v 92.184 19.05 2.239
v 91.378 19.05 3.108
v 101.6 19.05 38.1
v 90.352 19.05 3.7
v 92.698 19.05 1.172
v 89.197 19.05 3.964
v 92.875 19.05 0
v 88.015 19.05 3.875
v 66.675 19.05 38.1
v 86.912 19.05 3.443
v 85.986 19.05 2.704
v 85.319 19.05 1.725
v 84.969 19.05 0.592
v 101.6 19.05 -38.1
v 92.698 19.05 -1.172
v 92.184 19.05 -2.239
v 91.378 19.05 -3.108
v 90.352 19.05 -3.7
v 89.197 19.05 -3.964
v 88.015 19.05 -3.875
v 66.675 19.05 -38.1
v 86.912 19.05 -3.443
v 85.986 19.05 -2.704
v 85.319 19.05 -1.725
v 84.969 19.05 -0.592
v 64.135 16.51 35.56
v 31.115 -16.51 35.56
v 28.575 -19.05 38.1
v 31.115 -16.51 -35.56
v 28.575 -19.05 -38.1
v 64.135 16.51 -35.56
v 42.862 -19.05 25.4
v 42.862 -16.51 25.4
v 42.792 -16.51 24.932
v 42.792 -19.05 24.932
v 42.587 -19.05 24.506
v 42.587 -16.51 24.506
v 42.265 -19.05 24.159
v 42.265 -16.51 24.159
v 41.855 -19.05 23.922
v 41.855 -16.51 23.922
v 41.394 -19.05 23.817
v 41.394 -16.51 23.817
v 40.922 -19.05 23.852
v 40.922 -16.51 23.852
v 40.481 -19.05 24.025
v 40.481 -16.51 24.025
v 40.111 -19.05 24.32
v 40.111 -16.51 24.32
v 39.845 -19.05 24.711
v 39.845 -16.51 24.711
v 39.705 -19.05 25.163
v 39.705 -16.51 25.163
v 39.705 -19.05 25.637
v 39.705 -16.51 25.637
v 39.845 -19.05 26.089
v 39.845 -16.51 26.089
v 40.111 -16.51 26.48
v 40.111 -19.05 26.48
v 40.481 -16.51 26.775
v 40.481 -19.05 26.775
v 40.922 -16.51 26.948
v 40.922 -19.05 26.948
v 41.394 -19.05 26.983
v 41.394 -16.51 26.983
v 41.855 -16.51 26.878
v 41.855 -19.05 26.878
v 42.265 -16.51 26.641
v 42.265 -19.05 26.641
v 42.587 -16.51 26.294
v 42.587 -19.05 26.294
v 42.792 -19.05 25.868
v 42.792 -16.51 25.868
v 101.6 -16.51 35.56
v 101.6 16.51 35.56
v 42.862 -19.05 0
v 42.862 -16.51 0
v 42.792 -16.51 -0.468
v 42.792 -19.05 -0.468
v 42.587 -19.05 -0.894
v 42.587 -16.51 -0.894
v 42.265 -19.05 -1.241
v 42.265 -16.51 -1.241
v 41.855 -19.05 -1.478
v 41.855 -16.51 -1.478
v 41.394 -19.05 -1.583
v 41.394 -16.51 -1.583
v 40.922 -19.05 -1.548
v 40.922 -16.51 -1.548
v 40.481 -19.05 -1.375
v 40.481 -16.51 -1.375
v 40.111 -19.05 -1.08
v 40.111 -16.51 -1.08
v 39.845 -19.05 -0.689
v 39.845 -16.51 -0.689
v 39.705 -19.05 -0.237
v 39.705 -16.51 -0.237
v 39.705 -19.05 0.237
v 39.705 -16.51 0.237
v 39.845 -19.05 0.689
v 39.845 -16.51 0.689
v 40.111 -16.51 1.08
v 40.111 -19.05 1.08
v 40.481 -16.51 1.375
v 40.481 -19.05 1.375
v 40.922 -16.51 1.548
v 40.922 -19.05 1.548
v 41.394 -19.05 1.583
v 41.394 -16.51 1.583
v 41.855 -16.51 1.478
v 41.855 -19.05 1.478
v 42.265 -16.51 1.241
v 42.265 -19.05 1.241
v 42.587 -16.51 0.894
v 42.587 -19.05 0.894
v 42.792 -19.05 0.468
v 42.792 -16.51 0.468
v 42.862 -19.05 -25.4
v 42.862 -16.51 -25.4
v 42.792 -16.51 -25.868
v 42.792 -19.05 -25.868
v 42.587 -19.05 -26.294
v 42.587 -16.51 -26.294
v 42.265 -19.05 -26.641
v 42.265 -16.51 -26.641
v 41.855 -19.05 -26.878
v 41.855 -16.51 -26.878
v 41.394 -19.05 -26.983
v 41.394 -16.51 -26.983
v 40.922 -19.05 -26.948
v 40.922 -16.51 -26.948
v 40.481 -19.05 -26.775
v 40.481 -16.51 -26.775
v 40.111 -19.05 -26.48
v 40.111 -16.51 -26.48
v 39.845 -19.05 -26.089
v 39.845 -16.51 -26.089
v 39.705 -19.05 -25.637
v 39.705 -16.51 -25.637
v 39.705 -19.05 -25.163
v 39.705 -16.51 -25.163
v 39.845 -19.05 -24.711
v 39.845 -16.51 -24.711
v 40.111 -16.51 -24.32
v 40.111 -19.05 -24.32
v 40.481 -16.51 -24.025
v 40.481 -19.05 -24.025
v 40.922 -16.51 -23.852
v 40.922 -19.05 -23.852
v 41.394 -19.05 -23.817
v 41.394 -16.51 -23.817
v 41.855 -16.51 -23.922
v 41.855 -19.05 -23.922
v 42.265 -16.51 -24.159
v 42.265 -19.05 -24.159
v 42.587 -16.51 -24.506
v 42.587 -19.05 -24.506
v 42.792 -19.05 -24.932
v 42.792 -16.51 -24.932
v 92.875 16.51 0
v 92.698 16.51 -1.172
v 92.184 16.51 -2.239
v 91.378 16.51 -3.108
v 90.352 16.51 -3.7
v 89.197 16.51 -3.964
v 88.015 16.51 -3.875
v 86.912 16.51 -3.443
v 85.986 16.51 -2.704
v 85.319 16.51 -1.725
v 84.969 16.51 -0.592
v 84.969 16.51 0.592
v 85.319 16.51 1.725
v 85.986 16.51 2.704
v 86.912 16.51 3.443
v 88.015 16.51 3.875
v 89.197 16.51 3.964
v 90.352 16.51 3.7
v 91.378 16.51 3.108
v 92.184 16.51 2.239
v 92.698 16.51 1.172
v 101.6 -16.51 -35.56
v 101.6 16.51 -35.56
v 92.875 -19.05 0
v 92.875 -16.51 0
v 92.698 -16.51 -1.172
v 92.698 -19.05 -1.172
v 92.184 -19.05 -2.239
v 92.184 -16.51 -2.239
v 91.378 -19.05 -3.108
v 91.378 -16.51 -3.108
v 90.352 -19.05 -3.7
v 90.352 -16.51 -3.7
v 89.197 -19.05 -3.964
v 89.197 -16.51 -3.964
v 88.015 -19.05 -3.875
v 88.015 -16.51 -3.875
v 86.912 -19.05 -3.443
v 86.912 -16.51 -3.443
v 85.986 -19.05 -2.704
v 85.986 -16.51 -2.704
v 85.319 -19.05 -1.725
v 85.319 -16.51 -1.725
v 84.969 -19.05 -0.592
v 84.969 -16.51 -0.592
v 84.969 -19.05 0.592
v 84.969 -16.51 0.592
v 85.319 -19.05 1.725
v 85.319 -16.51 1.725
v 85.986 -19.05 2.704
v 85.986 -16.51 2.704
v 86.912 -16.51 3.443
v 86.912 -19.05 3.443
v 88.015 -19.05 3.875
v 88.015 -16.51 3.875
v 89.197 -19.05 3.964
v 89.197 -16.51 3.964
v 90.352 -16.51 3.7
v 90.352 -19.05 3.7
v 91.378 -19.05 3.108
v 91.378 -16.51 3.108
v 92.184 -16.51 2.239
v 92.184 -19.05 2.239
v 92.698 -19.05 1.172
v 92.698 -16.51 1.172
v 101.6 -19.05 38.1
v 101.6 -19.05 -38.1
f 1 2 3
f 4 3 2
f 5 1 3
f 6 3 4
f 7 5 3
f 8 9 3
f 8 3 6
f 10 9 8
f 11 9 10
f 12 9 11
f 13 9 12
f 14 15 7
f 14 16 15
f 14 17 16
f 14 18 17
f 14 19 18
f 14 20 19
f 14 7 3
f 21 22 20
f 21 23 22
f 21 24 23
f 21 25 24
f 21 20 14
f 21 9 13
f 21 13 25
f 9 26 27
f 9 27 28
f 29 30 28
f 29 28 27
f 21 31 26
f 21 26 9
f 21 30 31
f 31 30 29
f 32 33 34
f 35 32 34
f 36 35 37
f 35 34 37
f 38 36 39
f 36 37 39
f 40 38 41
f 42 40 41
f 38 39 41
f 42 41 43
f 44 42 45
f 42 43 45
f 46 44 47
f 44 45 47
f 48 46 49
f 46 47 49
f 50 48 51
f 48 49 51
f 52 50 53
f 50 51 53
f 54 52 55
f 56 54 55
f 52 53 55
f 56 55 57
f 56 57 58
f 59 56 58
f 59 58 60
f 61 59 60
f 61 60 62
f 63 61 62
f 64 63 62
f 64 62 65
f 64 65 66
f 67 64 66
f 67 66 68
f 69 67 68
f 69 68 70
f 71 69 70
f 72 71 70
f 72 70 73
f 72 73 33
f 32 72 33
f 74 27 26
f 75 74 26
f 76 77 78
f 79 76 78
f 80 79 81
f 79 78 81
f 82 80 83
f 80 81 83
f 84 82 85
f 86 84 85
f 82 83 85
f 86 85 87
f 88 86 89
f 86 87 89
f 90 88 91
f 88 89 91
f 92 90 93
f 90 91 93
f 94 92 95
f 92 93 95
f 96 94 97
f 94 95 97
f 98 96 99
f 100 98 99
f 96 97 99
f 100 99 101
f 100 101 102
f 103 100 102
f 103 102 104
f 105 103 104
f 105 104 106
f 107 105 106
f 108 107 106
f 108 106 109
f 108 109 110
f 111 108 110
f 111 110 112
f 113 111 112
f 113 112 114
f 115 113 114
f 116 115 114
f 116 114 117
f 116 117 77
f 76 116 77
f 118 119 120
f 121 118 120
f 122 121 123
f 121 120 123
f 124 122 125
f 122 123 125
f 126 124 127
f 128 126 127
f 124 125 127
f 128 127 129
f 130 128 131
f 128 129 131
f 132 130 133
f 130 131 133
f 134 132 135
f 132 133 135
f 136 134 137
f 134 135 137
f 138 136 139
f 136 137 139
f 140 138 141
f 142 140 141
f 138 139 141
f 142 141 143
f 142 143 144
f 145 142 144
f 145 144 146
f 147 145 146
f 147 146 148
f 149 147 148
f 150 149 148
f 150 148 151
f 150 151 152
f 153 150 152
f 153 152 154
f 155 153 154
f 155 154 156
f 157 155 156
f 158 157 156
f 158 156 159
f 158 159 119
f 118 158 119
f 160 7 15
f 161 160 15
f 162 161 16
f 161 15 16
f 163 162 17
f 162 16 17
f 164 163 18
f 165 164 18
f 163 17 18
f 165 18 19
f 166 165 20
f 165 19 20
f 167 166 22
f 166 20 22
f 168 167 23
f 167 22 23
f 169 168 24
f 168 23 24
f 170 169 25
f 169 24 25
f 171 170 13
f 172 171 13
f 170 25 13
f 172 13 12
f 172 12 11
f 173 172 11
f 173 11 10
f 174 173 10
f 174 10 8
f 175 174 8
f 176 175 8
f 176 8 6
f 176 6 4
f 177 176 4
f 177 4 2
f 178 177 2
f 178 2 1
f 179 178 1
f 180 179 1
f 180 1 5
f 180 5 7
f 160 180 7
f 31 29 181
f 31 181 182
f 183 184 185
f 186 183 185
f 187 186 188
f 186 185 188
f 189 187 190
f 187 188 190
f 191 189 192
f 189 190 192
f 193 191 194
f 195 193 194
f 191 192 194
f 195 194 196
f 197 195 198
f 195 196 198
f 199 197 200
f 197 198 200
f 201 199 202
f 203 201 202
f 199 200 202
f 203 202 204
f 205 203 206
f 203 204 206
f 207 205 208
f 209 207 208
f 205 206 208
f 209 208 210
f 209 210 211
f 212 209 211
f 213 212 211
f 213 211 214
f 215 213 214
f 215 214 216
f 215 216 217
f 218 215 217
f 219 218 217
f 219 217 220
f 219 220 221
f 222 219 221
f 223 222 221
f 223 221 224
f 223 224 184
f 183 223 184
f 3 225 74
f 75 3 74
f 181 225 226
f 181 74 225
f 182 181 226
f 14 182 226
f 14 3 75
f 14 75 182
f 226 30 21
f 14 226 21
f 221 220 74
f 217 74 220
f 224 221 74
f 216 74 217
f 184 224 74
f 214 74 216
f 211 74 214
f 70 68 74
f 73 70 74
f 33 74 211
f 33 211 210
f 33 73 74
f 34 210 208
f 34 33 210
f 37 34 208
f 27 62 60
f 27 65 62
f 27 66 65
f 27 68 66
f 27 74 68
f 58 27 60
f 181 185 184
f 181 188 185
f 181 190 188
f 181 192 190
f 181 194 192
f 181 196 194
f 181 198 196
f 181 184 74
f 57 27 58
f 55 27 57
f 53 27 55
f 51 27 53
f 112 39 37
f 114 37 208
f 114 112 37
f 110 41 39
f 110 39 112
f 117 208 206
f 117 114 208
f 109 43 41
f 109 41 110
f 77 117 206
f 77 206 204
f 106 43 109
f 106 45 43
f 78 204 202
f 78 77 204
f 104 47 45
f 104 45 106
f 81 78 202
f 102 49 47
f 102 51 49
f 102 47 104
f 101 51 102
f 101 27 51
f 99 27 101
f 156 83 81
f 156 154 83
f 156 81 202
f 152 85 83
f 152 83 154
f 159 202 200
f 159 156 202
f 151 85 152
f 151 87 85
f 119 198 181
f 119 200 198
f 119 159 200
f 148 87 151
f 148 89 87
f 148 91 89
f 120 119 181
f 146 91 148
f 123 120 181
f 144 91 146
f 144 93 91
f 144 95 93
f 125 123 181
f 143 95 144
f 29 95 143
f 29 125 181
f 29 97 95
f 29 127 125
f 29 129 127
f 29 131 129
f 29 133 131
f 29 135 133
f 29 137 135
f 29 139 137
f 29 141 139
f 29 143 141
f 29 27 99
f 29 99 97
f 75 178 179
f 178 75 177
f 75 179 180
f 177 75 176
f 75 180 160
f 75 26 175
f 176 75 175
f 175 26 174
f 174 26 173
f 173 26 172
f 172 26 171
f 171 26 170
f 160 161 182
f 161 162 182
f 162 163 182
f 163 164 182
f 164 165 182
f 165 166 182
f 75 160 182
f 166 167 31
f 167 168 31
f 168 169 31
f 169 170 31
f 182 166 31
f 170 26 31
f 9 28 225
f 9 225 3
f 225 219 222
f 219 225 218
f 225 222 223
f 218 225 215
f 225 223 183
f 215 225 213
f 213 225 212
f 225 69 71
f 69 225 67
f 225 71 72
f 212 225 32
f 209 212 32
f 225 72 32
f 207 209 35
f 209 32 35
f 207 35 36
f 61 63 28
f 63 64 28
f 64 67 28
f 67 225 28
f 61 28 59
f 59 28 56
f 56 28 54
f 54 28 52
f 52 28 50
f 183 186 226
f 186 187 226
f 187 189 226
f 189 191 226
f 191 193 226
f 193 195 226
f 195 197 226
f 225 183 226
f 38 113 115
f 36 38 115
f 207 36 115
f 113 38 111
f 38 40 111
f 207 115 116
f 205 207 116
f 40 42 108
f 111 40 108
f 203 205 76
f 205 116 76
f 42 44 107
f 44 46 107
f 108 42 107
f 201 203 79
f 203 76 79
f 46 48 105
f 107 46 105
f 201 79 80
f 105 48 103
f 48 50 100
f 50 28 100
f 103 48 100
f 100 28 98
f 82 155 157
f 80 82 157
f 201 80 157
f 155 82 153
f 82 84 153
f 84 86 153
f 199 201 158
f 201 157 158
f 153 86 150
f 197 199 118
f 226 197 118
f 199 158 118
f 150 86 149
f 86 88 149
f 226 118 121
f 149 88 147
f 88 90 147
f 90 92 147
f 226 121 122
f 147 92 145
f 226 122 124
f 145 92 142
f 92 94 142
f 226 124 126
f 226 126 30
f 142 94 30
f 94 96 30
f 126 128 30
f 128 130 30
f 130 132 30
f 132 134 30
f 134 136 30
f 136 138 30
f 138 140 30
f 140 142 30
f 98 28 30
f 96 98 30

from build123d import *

# Parameters (mm, degrees)
SKETCH1_W           = 76.2
SKETCH1_H           = 38.1
SKETCH1_W_2         = 71.12
SKETCH1_H_2         = 33.02
EXTRUDE_THIN1_DEPTH = 101.6
SKETCH7_R           = 3.9751
CUT_EXTRUDE6_DEPTH  = 39.1
SKETCH10_W          = 76.2
SKETCH10_H          = 38.1
CUT_EXTRUDE9_DEPTH  = 28.575
CUT_EXTRUDE10_DEPTH = 77.2
SKETCH9_R           = 1.5875
CUT_EXTRUDE11_DEPTH = 3.54


with BuildPart() as part:
    # Sketch1 → Extrude-Thin1 (new body)
    with BuildSketch(Plane(origin=(0, 0, 0), x_dir=(0, 0, -1), z_dir=(1, 0, 0))):
        Rectangle(SKETCH1_W, SKETCH1_H)
        Rectangle(SKETCH1_W_2, SKETCH1_H_2, mode=Mode.SUBTRACT)
    extrude(amount=EXTRUDE_THIN1_DEPTH)

    # Sketch7 → Cut-Extrude6 (cut, through all)
    with BuildSketch(Plane(origin=(0, 19.05, 0), x_dir=(1, 0, 0), z_dir=(0, 1, 0))):
        with Locations((88.9, 0)):
            Circle(SKETCH7_R)
    extrude(amount=-CUT_EXTRUDE6_DEPTH, mode=Mode.SUBTRACT)

    # Sketch10 → Cut-Extrude9 (cut)
    with BuildSketch(Plane.ZY):
        Rectangle(SKETCH10_W, SKETCH10_H)
    extrude(amount=-CUT_EXTRUDE9_DEPTH, mode=Mode.SUBTRACT)

    # Sketch11 → Cut-Extrude10 (cut, through all)
    with BuildSketch(Plane(origin=(0, 0, -38.1), x_dir=(-1, 0, 0), z_dir=(0, 0, -1))):
        Polygon((-28.575, -19.05), (-66.675, 19.05), (-28.575, 19.05), align=None)
    extrude(amount=-CUT_EXTRUDE10_DEPTH, mode=Mode.SUBTRACT)

    # Sketch9 → Cut-Extrude11 (cut, through all)
    with BuildSketch(Plane(origin=(0, -16.51, 0), x_dir=(1, 0, 0), z_dir=(0, 1, 0))):
        with Locations((41.275, 0)):
            Circle(SKETCH9_R)
        with Locations((41.275, -25.4)):
            Circle(SKETCH9_R)
        with Locations((41.275, 25.4)):
            Circle(SKETCH9_R)
    extrude(amount=-CUT_EXTRUDE11_DEPTH, mode=Mode.SUBTRACT)


solid = part.part
